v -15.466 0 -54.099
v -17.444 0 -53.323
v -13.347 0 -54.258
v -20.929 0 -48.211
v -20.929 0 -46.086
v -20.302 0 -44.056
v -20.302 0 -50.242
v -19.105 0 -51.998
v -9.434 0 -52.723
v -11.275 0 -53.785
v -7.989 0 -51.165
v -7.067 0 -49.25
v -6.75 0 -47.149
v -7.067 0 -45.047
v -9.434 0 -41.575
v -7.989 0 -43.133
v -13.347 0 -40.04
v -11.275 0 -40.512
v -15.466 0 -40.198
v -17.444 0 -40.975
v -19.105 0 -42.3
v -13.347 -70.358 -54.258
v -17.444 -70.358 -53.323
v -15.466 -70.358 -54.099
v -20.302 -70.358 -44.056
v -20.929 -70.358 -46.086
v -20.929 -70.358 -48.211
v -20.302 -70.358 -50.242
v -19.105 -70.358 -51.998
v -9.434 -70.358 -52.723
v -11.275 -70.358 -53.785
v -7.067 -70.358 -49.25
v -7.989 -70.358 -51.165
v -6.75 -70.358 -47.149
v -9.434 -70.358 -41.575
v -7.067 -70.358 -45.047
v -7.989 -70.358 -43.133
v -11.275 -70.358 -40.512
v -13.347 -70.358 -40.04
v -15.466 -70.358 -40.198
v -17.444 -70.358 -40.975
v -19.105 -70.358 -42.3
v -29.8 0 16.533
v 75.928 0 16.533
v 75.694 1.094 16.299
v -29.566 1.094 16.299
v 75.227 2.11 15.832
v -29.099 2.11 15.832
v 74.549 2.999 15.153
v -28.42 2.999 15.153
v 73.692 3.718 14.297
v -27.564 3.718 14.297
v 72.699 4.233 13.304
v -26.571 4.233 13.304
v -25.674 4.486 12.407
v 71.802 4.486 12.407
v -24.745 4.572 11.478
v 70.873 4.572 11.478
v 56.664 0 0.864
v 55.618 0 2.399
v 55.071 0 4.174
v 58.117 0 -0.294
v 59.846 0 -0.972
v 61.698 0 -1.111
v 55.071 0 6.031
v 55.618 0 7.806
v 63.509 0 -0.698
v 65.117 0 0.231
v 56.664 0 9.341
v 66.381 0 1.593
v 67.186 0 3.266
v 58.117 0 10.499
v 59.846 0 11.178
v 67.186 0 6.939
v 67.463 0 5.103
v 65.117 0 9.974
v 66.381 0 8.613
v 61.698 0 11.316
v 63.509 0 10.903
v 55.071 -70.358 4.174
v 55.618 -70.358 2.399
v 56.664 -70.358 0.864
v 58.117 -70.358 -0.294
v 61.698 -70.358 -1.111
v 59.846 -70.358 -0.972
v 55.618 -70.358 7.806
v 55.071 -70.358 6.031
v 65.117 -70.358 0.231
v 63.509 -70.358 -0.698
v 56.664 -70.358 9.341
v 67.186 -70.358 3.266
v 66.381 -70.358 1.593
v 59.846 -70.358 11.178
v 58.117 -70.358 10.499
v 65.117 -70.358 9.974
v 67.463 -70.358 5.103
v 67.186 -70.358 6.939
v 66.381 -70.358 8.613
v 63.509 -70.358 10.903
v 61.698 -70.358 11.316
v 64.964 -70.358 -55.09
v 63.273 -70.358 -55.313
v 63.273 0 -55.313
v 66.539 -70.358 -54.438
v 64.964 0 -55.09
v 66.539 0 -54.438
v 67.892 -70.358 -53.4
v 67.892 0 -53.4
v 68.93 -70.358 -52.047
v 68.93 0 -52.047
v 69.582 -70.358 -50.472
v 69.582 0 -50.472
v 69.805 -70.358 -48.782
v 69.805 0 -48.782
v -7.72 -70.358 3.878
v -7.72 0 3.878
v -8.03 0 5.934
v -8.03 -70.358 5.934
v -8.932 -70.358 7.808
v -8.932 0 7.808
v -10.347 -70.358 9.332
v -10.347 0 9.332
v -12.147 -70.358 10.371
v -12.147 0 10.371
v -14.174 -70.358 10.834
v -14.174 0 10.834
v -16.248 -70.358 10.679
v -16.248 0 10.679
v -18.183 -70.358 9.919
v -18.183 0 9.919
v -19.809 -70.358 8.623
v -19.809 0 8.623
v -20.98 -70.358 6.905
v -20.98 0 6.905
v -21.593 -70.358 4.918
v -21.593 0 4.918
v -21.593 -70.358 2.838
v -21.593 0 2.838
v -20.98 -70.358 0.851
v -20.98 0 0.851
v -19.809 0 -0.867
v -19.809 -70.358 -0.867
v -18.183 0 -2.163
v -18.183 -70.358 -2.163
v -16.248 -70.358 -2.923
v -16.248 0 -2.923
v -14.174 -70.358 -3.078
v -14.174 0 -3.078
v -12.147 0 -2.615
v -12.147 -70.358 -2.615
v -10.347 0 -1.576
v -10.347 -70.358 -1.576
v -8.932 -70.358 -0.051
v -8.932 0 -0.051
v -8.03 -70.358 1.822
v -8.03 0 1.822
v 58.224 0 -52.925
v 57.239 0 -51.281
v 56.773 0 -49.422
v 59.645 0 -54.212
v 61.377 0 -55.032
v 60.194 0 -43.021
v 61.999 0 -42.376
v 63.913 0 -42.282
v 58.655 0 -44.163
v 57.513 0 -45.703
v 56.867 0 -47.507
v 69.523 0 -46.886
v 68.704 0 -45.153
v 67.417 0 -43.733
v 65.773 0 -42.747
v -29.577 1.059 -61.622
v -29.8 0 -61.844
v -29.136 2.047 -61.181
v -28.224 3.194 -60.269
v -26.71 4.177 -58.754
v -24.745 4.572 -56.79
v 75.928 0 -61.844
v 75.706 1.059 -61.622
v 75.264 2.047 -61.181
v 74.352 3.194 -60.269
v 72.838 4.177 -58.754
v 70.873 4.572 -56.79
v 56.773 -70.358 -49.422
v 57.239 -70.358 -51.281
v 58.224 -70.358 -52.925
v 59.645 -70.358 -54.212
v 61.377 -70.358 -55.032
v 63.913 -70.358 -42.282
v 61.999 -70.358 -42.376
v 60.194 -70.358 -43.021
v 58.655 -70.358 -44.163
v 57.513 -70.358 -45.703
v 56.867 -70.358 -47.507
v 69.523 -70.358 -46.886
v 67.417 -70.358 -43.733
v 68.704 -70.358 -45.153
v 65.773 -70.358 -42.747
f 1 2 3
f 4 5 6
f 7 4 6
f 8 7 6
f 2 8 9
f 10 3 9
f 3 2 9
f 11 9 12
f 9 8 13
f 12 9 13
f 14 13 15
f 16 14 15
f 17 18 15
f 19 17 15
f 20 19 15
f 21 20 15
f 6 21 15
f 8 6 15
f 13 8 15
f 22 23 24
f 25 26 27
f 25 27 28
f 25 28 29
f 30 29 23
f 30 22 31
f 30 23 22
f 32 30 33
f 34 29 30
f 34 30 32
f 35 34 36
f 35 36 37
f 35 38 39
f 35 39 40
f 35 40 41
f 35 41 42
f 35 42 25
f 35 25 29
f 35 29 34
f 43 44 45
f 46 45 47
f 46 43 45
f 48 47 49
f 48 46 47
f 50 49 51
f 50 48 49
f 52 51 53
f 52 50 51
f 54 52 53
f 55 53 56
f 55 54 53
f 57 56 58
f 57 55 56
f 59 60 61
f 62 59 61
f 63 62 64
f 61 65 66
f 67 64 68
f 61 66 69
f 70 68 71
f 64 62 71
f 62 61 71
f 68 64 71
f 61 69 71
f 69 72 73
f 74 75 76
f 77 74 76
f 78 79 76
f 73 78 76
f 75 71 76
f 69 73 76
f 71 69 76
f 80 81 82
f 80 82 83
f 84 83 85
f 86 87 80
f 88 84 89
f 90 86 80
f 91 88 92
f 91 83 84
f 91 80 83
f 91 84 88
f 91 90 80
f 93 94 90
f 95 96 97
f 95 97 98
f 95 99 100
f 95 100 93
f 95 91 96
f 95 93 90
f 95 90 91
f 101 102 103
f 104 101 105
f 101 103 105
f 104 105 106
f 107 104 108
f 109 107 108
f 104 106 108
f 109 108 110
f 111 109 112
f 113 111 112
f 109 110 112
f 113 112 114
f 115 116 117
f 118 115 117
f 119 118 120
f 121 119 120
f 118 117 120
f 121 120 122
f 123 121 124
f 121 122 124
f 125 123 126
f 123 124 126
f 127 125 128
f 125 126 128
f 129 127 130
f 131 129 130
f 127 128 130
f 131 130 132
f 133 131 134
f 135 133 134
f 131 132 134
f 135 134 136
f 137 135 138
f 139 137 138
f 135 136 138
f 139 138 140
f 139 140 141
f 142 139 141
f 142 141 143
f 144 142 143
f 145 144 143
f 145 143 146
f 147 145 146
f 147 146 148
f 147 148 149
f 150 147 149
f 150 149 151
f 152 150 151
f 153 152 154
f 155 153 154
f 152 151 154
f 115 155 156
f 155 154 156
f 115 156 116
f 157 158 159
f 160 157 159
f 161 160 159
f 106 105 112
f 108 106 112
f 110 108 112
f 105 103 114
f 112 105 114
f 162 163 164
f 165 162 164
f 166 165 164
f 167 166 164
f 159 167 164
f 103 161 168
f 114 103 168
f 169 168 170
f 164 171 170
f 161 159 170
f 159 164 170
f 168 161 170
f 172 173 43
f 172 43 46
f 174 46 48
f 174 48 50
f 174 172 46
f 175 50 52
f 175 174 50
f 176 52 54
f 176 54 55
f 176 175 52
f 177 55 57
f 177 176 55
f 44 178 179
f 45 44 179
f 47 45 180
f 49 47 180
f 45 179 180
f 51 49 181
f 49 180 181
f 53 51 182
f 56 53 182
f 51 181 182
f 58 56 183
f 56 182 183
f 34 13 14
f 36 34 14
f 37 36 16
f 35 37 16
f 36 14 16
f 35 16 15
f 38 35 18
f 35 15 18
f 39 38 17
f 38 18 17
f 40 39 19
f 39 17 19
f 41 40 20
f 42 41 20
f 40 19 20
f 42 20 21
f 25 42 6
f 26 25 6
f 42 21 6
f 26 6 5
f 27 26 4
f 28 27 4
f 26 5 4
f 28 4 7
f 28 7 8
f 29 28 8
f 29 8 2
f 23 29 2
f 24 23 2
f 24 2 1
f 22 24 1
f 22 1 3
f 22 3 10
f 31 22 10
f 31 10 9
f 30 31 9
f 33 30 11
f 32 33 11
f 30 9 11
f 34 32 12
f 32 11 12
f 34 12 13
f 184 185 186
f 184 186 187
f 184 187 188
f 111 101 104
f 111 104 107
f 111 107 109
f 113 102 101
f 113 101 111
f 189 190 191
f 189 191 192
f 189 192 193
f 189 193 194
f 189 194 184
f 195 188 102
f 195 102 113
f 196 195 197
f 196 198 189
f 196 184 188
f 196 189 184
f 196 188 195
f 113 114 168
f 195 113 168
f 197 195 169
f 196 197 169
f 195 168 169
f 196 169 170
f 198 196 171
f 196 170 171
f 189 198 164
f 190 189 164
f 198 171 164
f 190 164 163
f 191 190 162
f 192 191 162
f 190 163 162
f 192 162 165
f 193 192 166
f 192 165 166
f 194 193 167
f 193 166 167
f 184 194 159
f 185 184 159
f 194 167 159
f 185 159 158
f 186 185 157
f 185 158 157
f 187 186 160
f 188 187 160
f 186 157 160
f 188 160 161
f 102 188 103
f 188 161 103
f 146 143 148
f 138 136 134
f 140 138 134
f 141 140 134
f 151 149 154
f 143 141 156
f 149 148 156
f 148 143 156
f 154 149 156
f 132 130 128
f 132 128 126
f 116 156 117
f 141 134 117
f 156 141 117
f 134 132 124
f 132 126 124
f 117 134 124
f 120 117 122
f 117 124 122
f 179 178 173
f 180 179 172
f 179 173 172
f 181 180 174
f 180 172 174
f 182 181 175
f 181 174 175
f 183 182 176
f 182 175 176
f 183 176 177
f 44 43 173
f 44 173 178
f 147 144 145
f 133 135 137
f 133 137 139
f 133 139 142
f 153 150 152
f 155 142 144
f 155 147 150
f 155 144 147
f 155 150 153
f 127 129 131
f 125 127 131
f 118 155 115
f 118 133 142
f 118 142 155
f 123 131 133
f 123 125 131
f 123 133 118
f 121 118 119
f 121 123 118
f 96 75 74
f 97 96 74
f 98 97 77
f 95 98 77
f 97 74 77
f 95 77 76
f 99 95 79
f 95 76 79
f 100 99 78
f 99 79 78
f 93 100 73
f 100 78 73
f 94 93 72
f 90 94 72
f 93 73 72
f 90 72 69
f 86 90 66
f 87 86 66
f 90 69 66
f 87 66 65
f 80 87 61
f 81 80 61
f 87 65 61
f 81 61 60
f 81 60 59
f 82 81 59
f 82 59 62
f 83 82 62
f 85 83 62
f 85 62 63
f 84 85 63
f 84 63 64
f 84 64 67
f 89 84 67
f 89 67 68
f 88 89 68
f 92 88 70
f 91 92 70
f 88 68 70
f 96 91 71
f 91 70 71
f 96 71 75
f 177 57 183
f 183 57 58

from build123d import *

# Parameters (mm, degrees)
F0_R        = 6.9755689081
F1_DEPTH    = 70.358
F0_R_2      = 7.1291532236
F0_R_3      = 6.2311216895
F2_W        = 105.7274974883
F2_H        = 78.3771444112
F3_DEPTH    = 4.572
F4_T1_DEPTH = 131.0001783908
F4_T3_DEPTH = 103.6498253137


# Not quite as in the source:
# - a fillet or chamfer that OpenCascade refuses, or shapes differently, is made with other operations: its cross-section is extruded or revolved along the edge and cut away or added


with BuildPart() as f1:
    # F0 (on Front) → F1 (new body)
    with BuildSketch(Plane.XZ):
        with Locations((-14.6957142279, 3.8780358154)):
            Circle(F0_R)
    extrude(amount=F1_DEPTH)


with BuildPart() as f1b:
    # F0 (on Front) → F1, piece 2 (new body)
    with BuildSketch(Plane.XZ):
        with Locations((-13.8792861253, -47.1487529576)):
            Circle(F0_R_2)
    extrude(amount=F1_DEPTH)


with BuildPart() as f1c:
    # F0 (on Front) → F1, piece 3 (new body)
    with BuildSketch(Plane.XZ):
        with Locations((61.2321421504, 5.1026786678)):
            Circle(F0_R_3)
    extrude(amount=F1_DEPTH)


with BuildPart() as f1d:
    # F0 (on Front) → F1, piece 4 (new body)
    with BuildSketch(Plane.XZ):
        with BuildLine():
            ThreePointArc((69.8046460748, -48.7816073), (58.6547937541, -44.1631872504), (63.2732138038, -55.313039571))
            ThreePointArc((63.2732138038, -55.313039571), (67.8916338535, -53.4000273497), (69.8046460748, -48.7816073))
        make_face()
    extrude(amount=F1_DEPTH)


with BuildPart() as f3:
    # F2 (on Front) → F3 (new body)
    with BuildSketch(Plane.XZ):
        with Locations((23.0641048402, -22.6558921859)):
            Rectangle(F2_W, F2_H)
    extrude(amount=-F3_DEPTH)

    # F4: fillet of radius 5.08 on 4 edges, made by hand

    # F4_s2 → F4_t1 (cut)
    with BuildSketch(Plane.YZ.offset(-42.4359843552)):
        with BuildLine():
            ThreePointArc((0, 16.5326800197), (3.2594288314, 14.8859114369), (4.572, 11.4781438392))
            Line((4.572, 11.4781438392), (4.572, 16.5326800197))
            Line((4.572, 16.5326800197), (0, 16.5326800197))
        make_face()
        with BuildLine():
            ThreePointArc((0, -61.8444643915), (3.2594288314, -60.1976958087), (4.572, -56.789928211))
            Line((4.572, -56.789928211), (4.572, -61.8444643915))
            Line((4.572, -61.8444643915), (0, -61.8444643915))
        make_face()
    extrude(amount=F4_T1_DEPTH, mode=Mode.SUBTRACT)

    # F4_s4 → F4_t3 (cut)
    with BuildSketch(Plane.XY.offset(-74.4808048427)):
        with BuildLine():
            ThreePointArc((75.9278535843, 0), (74.2810850015, 3.2594288314), (70.8733174038, 4.572))
            Line((70.8733174038, 4.572), (75.9278535843, 4.572))
            Line((75.9278535843, 4.572), (75.9278535843, 0))
        make_face()
        with BuildLine():
            ThreePointArc((-29.799643904, 0), (-28.1528753212, 3.2594288314), (-24.7451077235, 4.572))
            Line((-24.7451077235, 4.572), (-29.799643904, 4.572))
            Line((-29.799643904, 4.572), (-29.799643904, 0))
        make_face()
    extrude(amount=F4_T3_DEPTH, mode=Mode.SUBTRACT)


solid = Compound([f1.part, f1b.part, f1c.part, f1d.part, f3.part])
